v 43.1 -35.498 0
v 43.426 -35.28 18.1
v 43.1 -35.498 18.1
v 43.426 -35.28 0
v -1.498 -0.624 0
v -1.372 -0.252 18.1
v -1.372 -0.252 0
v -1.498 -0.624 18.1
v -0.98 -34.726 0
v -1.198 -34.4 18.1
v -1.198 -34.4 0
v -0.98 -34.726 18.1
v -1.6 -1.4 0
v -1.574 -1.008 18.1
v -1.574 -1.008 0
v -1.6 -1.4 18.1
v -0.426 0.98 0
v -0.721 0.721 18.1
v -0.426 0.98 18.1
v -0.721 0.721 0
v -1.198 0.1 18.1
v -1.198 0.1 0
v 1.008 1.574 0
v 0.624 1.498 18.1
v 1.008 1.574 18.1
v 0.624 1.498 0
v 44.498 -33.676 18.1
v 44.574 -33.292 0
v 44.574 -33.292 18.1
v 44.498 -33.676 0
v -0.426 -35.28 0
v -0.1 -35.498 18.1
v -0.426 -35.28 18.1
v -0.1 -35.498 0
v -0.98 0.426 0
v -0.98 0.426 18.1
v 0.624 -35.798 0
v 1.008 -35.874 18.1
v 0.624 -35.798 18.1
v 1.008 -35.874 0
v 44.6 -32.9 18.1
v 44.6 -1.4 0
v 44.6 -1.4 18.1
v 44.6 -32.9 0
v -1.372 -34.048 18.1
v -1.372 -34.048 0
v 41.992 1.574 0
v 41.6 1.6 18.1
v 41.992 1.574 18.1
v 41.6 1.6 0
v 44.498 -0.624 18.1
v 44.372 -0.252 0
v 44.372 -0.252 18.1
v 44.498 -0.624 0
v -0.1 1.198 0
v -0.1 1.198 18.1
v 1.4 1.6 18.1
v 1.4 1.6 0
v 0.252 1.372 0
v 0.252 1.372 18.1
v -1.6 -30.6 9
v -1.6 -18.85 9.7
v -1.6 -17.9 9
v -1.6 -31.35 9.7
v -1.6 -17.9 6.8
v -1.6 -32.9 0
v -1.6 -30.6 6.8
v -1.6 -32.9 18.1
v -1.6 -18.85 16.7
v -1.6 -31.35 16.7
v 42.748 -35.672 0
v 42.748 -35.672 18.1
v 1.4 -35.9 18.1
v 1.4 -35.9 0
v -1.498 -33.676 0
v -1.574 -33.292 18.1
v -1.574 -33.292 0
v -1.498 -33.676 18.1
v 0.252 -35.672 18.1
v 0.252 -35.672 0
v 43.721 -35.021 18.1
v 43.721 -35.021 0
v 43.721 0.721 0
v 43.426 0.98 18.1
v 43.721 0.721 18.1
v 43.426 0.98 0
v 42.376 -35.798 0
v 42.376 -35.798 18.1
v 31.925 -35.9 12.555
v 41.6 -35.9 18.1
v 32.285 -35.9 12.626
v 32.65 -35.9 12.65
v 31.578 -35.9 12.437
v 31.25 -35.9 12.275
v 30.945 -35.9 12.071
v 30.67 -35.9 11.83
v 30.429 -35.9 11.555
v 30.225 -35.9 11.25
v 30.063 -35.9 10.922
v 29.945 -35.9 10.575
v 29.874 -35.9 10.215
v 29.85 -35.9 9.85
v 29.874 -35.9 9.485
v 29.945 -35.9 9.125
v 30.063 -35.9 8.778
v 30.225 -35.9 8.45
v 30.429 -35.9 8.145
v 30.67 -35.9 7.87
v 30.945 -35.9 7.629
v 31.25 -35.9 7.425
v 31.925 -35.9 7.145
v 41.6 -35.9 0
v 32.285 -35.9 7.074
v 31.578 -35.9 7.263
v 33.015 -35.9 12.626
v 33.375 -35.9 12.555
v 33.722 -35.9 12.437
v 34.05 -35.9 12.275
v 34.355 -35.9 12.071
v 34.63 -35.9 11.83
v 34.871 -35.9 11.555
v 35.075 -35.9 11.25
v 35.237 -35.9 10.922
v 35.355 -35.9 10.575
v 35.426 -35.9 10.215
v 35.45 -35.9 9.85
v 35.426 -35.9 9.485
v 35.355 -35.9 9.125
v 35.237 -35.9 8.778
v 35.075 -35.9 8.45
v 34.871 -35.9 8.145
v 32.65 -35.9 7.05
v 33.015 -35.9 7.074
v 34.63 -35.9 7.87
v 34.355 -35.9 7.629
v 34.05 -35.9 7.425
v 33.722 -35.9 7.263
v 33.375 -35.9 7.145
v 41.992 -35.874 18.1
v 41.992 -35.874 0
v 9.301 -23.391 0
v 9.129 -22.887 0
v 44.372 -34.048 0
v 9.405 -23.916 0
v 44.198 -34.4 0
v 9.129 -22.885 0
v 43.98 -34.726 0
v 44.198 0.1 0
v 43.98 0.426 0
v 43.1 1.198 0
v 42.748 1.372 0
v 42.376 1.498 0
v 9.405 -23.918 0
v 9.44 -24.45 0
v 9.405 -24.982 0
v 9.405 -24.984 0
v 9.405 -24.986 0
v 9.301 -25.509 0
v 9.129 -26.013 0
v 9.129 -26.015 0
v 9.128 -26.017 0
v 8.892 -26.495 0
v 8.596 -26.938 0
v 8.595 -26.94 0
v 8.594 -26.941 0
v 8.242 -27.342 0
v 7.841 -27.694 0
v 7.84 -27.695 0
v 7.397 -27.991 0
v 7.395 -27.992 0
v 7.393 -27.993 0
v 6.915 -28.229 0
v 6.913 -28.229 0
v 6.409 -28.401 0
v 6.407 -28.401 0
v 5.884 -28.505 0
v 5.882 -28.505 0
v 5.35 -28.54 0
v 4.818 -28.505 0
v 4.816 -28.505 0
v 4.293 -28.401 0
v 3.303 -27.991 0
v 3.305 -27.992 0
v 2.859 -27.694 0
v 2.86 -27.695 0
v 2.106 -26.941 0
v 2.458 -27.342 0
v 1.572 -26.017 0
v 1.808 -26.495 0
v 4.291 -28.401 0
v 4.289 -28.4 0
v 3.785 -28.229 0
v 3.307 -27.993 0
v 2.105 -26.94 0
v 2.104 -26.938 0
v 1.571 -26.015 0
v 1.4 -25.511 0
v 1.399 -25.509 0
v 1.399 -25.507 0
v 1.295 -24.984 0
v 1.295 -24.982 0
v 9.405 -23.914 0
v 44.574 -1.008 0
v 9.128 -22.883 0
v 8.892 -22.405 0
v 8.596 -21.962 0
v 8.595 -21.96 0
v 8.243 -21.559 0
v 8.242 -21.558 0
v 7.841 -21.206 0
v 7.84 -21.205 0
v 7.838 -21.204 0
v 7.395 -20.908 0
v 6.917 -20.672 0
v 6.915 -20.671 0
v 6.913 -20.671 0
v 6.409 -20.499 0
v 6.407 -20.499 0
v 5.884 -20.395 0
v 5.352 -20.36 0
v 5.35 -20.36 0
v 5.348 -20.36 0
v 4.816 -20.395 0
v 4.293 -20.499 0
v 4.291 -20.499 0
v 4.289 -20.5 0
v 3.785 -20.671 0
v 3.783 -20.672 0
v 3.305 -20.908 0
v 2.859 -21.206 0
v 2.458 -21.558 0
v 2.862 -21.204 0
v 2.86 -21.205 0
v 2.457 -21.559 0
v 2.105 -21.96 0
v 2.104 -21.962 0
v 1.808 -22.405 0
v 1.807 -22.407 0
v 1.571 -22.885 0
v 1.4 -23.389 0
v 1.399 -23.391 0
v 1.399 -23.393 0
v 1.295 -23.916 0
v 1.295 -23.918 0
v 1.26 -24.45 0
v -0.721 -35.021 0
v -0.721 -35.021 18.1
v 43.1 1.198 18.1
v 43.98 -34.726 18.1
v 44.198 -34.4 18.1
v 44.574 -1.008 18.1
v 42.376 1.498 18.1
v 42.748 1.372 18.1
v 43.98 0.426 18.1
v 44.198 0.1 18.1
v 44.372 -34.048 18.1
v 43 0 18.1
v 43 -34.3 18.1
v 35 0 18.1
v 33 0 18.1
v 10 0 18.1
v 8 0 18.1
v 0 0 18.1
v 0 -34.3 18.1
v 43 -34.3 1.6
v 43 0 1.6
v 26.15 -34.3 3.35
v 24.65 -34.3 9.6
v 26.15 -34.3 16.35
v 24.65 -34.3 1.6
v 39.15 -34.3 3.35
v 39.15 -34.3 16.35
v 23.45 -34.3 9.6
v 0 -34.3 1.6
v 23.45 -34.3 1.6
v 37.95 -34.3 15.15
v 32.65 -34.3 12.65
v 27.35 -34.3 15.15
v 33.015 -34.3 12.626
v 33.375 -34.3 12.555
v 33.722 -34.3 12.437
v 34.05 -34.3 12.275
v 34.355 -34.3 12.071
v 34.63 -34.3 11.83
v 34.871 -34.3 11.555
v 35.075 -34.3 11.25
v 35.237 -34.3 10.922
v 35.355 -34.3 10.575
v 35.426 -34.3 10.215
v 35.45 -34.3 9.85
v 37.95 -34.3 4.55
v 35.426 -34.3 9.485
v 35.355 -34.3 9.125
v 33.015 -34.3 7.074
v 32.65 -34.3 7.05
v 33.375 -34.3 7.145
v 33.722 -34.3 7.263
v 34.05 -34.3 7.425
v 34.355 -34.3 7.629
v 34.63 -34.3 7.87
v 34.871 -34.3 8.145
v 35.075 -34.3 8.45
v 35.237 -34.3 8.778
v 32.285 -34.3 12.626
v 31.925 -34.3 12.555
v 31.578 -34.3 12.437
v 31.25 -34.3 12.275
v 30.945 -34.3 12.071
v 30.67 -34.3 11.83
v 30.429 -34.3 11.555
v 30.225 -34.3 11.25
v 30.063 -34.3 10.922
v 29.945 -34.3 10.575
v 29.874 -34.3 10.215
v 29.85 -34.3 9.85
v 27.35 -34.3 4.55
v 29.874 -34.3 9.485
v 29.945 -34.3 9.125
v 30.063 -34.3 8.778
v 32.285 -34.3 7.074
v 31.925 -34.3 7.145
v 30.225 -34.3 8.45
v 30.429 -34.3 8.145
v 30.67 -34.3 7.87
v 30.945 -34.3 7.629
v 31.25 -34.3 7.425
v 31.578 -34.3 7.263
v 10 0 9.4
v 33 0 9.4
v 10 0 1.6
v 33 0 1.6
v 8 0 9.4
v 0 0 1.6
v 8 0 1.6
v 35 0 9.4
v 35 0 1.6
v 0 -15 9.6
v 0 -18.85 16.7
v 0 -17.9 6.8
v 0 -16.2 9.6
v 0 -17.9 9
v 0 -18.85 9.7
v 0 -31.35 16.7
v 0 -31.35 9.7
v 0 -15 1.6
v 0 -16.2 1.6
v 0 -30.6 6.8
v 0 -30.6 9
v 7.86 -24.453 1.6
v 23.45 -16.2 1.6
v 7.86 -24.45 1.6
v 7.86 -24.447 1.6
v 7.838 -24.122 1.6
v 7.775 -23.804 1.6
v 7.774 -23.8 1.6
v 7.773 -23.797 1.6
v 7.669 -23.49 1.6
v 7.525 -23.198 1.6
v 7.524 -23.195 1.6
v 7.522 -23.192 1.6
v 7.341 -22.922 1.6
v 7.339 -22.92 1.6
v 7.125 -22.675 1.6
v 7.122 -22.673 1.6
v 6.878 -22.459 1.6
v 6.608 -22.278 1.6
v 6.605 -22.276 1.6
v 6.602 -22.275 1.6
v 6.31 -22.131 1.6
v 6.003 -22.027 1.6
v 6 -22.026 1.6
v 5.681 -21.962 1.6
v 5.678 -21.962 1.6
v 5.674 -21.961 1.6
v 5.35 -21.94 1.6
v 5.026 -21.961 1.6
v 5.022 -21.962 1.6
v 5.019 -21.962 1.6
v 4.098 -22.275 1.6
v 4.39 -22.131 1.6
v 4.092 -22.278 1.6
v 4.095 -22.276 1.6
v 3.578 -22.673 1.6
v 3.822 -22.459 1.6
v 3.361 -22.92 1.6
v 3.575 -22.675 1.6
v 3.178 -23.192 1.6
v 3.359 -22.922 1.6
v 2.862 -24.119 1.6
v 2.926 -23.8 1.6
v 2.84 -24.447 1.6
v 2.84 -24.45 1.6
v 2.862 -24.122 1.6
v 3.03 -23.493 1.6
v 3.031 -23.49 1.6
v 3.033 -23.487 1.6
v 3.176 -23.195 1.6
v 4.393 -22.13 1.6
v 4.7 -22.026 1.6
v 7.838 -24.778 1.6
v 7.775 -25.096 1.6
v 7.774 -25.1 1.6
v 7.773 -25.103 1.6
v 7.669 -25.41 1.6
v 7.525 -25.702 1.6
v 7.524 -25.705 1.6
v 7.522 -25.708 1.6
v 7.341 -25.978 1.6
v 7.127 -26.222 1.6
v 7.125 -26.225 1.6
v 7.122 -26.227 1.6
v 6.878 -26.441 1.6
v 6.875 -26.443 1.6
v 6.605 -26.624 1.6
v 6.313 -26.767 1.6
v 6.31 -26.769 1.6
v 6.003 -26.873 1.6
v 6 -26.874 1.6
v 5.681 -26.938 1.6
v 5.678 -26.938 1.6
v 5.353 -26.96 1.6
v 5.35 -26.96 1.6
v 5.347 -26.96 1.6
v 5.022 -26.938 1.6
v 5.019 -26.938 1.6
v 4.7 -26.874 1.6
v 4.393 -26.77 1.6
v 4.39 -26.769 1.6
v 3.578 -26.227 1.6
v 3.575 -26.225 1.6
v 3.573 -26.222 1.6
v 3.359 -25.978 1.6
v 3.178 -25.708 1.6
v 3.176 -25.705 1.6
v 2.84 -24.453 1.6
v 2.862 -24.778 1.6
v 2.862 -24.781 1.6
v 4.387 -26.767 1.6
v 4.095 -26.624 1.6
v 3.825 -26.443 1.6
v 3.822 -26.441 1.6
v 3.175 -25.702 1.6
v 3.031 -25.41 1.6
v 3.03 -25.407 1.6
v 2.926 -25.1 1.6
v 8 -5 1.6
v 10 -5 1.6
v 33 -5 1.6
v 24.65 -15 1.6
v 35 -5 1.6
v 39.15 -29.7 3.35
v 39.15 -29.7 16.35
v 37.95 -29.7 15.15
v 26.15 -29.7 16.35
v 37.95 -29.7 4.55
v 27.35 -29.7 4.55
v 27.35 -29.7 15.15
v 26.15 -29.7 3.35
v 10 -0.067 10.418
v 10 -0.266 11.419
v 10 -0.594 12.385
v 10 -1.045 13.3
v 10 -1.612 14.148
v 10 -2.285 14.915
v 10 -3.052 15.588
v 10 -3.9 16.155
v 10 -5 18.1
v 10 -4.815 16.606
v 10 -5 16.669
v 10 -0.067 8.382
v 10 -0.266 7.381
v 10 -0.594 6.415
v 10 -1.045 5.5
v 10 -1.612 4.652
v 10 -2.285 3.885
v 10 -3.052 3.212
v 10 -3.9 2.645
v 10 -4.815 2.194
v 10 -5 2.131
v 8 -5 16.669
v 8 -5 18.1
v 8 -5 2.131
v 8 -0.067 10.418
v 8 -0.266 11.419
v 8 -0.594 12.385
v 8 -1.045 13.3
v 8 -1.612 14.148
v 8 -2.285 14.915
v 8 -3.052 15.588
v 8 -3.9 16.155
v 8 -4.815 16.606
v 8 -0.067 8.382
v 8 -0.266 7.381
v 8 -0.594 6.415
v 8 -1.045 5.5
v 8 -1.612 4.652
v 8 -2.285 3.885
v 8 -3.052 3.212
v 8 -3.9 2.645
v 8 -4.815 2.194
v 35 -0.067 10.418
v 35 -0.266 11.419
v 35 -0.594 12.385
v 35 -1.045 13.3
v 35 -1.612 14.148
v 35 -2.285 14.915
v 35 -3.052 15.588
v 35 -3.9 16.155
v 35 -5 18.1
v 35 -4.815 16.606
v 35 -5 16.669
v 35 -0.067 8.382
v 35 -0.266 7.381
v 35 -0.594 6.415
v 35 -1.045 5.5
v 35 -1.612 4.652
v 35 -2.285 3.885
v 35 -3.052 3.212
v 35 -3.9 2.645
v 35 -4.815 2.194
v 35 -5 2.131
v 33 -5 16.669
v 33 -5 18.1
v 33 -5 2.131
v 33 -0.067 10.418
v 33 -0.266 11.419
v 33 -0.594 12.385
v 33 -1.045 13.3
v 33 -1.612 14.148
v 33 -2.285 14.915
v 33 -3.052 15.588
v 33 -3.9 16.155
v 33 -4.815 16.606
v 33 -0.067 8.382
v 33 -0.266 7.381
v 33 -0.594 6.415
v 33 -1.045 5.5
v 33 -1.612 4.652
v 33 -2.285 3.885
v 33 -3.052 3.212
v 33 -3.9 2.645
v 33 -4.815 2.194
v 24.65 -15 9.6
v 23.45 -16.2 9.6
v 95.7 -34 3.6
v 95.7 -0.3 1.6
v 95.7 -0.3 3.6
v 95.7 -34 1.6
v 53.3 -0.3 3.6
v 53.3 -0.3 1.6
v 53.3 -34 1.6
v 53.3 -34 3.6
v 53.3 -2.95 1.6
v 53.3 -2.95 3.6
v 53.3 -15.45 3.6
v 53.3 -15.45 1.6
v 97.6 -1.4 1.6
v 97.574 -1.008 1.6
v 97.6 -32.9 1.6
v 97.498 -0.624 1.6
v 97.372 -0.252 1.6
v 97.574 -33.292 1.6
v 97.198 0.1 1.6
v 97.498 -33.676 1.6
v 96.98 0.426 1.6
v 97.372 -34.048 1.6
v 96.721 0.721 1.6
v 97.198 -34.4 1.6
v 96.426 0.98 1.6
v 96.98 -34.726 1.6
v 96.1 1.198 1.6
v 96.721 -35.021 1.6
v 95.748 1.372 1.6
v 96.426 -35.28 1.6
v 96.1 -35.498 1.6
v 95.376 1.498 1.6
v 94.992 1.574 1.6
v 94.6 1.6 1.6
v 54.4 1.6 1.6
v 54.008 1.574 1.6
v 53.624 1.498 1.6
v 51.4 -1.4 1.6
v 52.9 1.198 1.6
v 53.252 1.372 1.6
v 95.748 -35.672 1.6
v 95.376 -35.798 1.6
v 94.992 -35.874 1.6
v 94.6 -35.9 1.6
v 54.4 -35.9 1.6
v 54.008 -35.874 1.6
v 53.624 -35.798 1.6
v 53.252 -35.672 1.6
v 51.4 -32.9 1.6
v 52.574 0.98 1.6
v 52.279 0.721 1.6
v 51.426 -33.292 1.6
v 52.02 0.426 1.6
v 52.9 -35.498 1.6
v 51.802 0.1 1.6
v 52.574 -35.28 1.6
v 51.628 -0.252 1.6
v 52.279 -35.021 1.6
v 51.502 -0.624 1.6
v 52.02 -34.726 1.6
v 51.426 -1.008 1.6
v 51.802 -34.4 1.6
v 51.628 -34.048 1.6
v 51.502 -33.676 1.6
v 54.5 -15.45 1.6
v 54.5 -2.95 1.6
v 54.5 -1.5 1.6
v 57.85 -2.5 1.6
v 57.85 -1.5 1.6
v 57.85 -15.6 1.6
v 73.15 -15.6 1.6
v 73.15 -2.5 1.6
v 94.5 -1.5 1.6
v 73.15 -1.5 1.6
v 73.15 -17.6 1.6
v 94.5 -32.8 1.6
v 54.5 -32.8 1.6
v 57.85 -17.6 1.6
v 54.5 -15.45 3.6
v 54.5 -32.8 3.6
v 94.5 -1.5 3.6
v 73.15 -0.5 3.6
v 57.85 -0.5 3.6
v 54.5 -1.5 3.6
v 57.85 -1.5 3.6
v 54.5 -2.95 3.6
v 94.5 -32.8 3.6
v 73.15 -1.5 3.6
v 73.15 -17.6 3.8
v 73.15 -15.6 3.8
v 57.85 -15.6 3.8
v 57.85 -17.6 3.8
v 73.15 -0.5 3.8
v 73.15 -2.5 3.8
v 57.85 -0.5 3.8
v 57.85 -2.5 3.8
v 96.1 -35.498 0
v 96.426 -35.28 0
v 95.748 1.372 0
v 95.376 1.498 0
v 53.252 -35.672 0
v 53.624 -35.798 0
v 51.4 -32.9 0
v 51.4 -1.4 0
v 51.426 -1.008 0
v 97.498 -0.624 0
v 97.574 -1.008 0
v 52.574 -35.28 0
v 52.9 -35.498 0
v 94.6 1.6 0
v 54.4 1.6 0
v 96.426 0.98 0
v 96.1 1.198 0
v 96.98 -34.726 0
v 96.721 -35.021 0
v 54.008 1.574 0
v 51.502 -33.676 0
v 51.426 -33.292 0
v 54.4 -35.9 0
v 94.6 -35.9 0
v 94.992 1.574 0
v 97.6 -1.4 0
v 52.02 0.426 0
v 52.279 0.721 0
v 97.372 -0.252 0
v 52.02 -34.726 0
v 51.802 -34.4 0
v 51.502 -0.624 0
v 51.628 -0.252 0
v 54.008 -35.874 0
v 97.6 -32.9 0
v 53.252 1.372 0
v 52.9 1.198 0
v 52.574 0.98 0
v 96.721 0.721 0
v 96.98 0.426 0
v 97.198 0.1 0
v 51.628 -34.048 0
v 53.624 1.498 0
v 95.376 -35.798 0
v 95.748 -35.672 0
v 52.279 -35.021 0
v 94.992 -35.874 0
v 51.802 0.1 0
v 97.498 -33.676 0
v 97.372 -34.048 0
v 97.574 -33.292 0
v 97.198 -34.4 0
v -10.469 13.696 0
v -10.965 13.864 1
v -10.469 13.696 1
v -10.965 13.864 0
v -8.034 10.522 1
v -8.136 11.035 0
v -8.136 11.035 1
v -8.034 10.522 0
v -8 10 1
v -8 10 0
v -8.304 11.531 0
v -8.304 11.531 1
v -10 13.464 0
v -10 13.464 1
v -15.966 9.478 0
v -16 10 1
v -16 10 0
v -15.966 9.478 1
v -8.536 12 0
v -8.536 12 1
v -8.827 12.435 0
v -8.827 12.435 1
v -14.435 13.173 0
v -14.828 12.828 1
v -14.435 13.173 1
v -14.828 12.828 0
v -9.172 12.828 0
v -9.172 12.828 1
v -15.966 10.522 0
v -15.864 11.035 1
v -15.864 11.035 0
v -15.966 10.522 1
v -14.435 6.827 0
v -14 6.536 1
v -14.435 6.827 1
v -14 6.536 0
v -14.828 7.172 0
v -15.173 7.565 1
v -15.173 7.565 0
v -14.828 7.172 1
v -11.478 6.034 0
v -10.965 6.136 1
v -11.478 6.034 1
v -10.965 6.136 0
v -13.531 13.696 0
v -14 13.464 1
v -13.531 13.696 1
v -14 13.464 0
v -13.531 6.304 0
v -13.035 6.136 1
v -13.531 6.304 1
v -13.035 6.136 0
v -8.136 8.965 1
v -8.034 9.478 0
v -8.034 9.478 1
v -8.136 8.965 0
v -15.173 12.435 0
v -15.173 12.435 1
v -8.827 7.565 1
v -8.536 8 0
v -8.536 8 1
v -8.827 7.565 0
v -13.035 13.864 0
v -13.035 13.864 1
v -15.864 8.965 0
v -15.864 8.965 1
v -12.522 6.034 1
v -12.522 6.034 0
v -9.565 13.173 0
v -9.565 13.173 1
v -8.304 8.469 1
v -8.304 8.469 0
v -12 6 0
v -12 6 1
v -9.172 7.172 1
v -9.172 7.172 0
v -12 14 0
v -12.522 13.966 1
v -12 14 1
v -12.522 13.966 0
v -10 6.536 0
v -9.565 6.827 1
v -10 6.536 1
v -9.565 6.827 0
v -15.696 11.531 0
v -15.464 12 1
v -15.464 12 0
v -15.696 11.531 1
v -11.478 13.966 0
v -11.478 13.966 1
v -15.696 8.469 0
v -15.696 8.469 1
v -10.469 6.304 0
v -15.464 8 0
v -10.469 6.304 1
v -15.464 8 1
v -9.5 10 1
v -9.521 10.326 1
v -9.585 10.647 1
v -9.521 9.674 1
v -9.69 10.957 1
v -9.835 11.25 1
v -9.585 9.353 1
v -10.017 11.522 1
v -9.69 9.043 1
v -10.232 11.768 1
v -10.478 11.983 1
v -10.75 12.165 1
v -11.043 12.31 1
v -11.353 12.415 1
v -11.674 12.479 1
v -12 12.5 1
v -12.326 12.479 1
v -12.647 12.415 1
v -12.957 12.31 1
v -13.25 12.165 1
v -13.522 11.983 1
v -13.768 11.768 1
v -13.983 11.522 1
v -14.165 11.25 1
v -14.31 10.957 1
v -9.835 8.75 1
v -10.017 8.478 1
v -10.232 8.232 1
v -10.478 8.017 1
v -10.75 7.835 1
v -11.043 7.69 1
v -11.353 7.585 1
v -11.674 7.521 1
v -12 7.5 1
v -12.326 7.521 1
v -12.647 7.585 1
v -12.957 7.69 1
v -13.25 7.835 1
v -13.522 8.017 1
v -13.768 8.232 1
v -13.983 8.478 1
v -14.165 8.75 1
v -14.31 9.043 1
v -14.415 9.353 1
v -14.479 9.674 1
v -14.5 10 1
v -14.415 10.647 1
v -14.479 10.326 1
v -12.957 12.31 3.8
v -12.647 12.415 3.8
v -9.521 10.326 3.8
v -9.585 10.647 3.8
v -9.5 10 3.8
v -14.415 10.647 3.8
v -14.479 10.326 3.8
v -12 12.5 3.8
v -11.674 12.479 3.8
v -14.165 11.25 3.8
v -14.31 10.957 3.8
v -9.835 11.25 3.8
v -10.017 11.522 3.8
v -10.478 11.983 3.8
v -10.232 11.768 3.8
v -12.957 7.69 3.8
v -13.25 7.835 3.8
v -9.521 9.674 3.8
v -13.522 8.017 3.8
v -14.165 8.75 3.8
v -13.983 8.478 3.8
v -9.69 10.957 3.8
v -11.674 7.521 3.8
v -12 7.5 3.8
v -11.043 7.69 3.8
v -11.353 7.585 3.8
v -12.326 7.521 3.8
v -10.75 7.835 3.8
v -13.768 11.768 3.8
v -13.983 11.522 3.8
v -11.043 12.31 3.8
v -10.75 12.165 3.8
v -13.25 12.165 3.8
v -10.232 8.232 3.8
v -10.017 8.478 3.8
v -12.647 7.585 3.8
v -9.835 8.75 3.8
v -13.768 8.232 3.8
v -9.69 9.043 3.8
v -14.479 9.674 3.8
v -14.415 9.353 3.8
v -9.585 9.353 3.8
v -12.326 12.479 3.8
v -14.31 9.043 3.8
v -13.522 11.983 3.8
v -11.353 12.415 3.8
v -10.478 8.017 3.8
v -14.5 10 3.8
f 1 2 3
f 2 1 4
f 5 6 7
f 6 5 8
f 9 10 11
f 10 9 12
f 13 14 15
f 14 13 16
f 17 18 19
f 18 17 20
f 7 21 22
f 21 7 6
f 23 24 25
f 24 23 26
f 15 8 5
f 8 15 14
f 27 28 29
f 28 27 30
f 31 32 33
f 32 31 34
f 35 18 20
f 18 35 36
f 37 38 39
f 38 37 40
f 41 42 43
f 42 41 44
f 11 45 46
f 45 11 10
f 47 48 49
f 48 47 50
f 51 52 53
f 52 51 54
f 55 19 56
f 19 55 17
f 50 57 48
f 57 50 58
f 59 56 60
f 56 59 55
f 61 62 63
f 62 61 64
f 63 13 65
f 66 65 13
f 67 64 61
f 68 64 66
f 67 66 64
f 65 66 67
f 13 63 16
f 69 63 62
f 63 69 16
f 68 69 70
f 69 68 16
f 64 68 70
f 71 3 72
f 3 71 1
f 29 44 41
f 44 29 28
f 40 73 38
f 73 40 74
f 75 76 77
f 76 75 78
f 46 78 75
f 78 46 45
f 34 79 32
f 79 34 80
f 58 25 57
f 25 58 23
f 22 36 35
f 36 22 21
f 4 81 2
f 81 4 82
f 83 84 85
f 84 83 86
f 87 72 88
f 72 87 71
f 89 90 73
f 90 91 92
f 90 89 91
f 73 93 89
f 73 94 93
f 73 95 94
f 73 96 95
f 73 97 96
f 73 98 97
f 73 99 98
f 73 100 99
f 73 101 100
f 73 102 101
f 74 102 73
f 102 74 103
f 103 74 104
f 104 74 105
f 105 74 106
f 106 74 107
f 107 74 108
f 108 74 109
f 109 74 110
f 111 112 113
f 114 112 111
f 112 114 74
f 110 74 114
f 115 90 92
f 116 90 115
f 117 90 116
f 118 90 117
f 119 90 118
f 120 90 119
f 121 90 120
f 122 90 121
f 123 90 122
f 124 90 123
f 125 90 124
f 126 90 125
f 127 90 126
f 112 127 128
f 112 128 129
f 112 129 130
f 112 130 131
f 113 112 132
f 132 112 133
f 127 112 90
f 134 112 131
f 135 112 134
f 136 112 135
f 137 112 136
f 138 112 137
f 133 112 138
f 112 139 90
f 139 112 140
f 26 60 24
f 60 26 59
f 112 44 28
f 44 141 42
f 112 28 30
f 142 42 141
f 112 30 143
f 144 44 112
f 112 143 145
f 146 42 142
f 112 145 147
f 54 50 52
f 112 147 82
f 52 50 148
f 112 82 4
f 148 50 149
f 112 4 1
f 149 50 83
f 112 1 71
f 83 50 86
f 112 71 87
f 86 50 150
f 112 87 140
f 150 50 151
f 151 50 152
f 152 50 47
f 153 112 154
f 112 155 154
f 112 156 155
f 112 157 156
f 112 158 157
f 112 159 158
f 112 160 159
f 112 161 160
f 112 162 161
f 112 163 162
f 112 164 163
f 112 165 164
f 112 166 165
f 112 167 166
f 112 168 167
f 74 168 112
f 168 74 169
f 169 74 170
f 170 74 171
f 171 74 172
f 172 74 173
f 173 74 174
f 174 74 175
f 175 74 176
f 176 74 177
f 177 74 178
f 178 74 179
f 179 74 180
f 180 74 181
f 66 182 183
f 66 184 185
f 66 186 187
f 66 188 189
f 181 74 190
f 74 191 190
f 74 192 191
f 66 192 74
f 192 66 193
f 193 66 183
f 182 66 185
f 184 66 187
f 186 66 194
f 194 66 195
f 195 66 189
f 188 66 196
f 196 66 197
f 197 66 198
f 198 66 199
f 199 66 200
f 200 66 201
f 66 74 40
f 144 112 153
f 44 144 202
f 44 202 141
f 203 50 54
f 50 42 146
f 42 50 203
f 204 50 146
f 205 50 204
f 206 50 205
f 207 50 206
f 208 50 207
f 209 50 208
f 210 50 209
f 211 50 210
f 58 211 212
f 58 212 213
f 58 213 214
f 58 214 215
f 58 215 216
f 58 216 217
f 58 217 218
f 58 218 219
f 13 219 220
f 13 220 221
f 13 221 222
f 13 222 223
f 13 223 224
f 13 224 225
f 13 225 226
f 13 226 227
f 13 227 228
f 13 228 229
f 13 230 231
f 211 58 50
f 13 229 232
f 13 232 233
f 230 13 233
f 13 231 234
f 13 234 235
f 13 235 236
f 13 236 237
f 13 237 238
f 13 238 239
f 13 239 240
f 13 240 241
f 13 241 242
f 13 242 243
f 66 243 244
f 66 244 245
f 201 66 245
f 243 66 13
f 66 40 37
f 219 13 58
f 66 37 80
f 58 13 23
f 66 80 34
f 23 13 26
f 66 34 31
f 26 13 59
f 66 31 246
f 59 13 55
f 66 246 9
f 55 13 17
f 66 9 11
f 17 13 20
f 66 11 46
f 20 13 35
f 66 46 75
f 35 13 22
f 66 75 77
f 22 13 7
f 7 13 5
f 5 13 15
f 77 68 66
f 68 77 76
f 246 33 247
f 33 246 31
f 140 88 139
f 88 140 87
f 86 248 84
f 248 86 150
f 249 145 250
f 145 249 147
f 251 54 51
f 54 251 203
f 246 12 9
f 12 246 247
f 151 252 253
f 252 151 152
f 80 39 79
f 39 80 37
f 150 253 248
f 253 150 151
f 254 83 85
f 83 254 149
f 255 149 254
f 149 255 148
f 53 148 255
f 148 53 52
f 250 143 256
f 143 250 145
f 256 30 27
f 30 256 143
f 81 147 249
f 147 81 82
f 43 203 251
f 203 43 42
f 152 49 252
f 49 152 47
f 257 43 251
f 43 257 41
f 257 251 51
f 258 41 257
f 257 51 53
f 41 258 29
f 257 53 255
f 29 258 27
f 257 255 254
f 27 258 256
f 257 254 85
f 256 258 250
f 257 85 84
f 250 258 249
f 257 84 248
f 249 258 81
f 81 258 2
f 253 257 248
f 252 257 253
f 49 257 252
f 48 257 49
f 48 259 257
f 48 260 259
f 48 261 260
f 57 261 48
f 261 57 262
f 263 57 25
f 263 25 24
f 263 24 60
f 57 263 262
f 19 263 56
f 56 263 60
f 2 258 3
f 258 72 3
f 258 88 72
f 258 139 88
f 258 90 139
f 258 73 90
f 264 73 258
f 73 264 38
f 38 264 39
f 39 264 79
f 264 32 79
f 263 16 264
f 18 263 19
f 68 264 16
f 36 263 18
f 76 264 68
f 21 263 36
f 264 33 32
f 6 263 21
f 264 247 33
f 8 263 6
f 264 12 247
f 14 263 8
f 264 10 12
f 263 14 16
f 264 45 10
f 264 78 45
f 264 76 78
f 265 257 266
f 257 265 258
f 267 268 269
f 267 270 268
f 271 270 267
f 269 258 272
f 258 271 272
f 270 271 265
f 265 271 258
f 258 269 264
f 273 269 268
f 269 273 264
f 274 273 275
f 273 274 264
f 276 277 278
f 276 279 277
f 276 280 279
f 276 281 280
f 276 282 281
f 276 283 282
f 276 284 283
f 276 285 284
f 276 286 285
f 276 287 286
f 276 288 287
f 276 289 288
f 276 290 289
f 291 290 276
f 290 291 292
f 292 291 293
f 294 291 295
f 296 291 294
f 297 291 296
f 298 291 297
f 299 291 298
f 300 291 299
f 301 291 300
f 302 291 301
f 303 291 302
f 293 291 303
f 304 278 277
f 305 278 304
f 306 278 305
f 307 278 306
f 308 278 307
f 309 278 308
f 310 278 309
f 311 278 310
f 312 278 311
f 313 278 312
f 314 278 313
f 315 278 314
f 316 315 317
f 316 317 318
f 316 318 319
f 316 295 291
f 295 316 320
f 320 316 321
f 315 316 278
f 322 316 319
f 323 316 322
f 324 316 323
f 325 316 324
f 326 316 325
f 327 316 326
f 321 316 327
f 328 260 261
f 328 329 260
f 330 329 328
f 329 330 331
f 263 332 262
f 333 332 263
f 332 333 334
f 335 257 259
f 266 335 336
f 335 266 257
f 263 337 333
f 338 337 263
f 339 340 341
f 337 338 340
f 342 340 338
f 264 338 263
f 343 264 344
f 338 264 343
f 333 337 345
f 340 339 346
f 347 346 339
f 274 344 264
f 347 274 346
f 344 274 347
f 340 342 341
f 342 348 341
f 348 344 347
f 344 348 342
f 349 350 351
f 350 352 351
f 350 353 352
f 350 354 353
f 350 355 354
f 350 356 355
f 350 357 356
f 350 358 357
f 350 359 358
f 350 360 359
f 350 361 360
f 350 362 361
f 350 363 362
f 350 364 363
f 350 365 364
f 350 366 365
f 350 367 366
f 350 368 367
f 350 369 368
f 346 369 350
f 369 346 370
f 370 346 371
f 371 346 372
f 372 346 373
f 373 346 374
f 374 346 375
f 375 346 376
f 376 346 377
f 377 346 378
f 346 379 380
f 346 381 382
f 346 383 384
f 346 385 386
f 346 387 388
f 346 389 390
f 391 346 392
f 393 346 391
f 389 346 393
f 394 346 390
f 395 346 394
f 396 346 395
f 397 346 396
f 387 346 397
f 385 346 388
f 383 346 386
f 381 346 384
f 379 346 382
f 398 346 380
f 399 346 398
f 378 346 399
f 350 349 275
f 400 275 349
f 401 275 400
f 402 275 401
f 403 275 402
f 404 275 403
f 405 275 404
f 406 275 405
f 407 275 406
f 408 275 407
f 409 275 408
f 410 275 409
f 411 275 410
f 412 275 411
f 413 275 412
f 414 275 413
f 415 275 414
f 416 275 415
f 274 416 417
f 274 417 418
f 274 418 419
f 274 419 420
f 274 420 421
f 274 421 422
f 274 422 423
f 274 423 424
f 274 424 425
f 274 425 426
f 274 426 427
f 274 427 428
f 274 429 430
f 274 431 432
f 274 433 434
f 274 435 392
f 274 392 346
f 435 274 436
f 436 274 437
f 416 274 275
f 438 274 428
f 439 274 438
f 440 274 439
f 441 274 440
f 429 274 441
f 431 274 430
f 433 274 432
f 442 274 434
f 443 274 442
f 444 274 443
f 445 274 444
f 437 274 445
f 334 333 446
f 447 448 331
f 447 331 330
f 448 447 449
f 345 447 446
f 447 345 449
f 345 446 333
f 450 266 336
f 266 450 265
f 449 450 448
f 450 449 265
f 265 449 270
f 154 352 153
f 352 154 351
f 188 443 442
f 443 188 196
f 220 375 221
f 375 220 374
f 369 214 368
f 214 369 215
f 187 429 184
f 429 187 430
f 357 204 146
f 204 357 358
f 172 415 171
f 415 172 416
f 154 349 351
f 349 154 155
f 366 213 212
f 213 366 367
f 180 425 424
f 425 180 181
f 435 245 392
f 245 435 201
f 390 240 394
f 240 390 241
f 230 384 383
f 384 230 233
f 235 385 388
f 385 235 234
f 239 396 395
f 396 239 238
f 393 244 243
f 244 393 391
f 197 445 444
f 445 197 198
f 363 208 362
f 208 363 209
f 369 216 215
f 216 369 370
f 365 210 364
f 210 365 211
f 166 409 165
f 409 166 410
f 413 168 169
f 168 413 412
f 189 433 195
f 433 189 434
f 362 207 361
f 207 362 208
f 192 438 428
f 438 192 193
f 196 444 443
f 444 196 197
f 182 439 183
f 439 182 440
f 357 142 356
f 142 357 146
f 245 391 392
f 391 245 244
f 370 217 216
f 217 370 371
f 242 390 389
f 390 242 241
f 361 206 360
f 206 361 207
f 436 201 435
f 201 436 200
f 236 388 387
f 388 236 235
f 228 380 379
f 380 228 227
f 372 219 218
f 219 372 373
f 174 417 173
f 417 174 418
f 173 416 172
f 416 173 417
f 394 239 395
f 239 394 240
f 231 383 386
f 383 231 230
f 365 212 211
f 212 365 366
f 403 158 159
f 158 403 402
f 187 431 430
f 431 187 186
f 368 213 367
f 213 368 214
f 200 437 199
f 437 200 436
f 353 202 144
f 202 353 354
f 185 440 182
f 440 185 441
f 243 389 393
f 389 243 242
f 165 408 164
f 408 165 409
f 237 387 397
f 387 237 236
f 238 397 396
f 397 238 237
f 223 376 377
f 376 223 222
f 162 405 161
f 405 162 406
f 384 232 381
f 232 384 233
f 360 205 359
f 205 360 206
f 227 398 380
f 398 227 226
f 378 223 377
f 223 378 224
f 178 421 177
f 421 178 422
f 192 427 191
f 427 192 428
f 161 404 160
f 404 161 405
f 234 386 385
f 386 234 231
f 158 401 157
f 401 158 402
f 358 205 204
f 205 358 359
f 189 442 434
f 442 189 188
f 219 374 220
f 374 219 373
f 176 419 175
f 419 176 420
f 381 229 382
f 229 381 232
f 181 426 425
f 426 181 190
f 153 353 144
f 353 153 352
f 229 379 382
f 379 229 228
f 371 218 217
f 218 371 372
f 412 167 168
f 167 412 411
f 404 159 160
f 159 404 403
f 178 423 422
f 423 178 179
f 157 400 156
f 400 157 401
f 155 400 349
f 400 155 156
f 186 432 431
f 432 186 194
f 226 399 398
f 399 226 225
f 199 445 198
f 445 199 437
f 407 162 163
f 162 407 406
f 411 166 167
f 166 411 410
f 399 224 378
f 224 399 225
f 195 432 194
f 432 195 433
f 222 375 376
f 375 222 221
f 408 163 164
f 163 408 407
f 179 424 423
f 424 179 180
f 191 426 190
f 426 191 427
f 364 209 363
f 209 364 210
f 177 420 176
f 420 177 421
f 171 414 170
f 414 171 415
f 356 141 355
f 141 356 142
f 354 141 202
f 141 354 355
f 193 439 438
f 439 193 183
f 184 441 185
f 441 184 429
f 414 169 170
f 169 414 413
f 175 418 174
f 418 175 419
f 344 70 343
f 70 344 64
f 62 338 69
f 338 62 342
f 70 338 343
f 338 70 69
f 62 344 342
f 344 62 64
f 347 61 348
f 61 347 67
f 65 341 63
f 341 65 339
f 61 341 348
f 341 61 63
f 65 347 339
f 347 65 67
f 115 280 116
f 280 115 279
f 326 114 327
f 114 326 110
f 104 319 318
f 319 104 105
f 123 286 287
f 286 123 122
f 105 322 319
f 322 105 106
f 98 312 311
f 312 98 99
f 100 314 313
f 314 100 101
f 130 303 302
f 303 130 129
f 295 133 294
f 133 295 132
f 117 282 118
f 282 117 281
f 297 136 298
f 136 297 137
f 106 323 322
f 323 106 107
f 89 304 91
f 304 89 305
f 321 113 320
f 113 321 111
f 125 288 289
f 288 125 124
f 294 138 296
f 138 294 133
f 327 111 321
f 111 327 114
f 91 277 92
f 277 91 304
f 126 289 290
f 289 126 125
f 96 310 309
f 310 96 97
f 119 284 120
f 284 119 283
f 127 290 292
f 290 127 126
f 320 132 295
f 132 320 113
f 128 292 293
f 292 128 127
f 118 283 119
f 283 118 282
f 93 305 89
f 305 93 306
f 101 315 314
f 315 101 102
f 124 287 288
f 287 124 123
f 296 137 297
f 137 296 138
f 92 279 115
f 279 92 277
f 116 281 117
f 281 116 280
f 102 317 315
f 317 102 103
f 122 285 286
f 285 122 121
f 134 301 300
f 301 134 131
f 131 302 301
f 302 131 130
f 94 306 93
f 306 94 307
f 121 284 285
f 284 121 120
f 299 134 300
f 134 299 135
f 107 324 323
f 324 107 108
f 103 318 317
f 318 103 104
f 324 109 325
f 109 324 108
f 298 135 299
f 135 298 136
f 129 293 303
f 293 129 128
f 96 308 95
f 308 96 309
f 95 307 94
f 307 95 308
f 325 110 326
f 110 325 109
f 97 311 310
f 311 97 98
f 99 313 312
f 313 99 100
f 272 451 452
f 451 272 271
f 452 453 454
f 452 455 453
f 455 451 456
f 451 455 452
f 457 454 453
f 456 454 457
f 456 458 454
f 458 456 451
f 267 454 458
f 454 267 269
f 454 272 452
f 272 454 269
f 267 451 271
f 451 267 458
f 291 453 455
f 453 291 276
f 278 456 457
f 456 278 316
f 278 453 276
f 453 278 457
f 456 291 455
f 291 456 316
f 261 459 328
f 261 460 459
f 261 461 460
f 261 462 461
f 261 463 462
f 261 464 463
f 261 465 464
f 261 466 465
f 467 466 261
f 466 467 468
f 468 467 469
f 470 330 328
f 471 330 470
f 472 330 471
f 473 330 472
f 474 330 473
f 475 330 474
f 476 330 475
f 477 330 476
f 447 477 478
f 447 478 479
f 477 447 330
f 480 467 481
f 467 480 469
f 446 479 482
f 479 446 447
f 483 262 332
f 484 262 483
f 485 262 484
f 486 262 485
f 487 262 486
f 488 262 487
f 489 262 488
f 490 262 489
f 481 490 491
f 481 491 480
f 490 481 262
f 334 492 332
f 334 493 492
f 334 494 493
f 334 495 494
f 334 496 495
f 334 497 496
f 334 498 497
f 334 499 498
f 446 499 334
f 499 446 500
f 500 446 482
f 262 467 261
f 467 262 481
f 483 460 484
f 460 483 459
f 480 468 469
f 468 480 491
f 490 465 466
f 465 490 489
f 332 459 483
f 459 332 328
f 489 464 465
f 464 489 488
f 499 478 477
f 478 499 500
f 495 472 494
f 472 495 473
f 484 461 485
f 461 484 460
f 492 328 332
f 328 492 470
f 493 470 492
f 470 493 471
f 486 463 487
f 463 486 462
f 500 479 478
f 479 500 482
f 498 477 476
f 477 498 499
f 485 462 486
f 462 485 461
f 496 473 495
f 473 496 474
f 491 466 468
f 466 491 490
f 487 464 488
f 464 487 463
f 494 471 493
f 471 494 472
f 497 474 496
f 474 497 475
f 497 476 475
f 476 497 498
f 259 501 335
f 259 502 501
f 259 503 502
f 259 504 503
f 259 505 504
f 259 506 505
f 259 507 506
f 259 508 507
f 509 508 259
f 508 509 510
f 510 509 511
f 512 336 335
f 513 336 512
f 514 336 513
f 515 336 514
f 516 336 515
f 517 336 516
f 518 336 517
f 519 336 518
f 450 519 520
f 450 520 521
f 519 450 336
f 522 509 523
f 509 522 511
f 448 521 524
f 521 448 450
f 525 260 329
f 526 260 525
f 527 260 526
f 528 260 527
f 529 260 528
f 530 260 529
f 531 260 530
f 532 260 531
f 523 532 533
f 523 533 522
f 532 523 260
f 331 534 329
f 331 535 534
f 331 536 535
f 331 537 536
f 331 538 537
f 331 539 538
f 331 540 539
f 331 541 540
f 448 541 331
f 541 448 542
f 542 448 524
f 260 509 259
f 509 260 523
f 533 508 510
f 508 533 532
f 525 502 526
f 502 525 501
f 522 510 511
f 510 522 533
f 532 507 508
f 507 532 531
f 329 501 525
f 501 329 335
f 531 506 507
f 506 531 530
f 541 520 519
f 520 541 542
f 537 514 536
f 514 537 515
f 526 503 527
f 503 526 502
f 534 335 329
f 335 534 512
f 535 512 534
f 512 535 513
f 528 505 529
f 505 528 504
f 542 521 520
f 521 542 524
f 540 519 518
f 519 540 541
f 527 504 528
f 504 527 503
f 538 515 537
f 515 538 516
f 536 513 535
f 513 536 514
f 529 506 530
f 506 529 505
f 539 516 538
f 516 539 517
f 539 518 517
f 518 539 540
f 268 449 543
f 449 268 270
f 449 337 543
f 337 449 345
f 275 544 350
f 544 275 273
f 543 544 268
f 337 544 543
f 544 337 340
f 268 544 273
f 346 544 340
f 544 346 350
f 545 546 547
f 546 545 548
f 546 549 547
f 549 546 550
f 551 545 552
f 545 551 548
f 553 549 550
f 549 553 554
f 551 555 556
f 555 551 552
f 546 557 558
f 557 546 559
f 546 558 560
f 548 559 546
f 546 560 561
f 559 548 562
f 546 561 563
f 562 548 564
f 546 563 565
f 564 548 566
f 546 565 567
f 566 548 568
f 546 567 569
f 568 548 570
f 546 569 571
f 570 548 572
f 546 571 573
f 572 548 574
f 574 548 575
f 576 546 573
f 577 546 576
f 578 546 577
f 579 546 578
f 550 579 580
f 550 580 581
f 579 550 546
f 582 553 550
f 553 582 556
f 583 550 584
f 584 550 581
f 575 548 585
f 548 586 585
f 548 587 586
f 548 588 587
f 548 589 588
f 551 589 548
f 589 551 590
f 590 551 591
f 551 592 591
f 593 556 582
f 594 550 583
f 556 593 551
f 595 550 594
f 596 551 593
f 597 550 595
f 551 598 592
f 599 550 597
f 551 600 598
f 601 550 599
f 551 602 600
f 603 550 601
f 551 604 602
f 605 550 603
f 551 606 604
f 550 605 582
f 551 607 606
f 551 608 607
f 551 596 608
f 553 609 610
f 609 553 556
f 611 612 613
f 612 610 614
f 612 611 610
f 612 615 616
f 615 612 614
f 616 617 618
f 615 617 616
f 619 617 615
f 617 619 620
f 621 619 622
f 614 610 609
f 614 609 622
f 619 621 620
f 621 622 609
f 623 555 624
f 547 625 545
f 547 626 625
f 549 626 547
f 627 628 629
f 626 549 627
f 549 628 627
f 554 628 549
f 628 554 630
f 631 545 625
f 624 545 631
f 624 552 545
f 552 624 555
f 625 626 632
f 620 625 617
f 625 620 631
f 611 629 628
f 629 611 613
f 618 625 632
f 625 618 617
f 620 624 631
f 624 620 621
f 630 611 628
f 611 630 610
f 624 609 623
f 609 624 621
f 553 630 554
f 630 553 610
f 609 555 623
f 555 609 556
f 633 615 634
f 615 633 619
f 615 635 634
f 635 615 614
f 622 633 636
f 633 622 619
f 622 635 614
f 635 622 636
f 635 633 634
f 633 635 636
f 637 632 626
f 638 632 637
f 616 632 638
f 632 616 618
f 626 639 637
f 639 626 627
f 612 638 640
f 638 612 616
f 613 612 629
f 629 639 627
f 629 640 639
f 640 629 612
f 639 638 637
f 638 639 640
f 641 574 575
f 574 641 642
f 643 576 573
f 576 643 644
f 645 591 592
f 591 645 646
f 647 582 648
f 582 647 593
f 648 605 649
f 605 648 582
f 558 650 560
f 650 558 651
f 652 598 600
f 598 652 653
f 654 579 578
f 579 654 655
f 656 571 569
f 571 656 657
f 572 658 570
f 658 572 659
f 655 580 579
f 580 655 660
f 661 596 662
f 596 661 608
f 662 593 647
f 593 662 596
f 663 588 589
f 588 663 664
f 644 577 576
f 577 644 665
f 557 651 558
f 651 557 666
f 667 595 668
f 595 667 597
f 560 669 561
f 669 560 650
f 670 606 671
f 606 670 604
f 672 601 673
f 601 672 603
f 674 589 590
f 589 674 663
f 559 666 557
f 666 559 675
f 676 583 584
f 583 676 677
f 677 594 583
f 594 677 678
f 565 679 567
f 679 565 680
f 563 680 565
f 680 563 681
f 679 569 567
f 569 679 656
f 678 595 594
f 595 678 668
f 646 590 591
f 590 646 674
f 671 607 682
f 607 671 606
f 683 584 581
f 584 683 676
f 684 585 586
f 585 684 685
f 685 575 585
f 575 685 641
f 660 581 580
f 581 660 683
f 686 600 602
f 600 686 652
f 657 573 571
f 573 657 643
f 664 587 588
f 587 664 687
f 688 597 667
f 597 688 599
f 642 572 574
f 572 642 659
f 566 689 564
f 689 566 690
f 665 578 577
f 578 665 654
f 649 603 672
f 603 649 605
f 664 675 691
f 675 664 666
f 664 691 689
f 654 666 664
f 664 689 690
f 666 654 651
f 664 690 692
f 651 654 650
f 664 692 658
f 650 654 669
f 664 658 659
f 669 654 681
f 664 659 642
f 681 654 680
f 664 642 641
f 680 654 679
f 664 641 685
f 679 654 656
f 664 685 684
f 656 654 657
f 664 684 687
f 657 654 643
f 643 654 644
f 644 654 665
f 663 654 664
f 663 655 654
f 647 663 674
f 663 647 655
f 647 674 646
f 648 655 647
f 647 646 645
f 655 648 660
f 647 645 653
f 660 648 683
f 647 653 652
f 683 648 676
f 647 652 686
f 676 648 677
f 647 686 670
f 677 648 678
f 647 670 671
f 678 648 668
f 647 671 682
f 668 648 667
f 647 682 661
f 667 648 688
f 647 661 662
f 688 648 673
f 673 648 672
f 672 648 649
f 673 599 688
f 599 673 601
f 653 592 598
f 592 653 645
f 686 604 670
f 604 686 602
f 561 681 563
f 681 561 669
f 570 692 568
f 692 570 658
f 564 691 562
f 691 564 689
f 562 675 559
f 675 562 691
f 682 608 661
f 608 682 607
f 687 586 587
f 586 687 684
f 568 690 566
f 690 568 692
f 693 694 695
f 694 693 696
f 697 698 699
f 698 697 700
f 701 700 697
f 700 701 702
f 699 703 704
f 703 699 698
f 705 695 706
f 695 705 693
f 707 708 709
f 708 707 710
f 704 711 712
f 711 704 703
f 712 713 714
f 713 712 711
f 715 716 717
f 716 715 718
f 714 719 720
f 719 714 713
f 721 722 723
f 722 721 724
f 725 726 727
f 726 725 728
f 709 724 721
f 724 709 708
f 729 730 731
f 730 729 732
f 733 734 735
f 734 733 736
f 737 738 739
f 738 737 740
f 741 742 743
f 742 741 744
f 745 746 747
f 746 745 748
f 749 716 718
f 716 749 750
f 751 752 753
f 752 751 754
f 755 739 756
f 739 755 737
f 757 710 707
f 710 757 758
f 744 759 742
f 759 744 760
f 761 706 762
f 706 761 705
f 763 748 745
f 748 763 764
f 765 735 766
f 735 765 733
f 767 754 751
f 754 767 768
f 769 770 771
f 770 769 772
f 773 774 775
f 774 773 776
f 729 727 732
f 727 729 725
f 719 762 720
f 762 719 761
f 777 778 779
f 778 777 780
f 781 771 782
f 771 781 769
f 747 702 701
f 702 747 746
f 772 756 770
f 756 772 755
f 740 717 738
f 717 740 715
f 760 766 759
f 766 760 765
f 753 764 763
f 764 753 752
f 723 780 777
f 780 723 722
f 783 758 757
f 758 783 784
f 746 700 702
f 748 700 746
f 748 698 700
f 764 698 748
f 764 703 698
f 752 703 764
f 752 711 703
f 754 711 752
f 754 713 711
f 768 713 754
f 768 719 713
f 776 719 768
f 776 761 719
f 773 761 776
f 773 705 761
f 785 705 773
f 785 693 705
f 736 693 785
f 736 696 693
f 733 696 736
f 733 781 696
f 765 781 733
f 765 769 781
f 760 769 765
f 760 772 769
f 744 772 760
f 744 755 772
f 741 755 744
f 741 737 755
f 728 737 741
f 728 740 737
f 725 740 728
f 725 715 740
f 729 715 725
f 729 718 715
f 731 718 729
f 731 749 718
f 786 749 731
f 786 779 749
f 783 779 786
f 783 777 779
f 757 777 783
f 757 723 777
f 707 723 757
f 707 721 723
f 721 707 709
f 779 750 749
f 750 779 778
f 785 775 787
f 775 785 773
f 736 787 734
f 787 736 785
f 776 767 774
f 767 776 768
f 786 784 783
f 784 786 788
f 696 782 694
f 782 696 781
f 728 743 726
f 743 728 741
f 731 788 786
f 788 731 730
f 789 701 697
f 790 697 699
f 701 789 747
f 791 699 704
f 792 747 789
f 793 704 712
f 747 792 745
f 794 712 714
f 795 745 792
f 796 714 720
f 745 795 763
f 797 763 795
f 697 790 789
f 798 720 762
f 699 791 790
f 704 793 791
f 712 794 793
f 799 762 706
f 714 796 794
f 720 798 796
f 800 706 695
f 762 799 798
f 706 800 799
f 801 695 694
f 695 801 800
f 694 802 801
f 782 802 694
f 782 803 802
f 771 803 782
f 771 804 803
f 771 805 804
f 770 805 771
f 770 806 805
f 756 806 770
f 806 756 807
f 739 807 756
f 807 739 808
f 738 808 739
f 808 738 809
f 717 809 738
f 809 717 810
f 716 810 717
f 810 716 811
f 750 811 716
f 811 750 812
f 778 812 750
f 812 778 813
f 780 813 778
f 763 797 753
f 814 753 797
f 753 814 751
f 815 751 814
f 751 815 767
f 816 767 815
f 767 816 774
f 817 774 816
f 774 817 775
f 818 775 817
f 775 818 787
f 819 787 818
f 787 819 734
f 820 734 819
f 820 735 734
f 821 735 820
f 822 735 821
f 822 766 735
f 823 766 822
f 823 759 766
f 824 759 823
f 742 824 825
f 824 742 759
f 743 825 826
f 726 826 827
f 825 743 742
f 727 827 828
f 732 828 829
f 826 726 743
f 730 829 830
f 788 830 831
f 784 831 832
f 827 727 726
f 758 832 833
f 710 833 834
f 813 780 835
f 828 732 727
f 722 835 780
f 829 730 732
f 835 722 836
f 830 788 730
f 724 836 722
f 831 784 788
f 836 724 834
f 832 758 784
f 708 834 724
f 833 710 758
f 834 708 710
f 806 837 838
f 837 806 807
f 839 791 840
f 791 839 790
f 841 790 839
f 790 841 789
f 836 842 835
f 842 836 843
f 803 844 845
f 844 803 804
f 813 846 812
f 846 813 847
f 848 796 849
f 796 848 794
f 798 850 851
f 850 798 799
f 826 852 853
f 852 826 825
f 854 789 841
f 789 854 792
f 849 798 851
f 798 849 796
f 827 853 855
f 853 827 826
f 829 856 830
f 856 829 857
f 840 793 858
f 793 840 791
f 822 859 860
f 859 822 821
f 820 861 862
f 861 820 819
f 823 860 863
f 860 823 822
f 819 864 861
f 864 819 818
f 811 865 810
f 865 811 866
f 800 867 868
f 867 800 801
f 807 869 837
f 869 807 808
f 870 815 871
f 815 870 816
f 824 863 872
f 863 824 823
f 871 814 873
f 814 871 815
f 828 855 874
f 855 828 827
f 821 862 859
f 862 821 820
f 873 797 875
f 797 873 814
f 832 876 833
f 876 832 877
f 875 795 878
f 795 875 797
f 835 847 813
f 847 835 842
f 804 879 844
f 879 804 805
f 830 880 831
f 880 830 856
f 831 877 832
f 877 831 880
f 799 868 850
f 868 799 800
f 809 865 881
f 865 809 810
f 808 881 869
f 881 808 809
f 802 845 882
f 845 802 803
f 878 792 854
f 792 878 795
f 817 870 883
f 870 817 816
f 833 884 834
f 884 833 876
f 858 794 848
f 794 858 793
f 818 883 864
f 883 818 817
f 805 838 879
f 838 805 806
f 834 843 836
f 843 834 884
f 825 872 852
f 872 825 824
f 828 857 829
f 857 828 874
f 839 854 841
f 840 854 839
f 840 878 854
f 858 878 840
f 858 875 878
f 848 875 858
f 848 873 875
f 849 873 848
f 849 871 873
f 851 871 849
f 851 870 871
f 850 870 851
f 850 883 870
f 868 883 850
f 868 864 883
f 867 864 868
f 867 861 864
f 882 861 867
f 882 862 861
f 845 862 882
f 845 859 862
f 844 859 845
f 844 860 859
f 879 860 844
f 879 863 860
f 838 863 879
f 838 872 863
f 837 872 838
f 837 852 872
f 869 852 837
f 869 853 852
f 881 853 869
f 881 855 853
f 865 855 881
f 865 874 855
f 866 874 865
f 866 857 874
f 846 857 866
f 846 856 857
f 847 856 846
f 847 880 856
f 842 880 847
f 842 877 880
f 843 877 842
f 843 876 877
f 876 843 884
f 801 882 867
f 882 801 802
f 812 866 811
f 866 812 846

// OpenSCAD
// mini-cam case: XIAO ESP32-S3 Sense + 15x40 mm cylinder LiPo + 10x10 mm button board.
// All sizes in mm. Change a number, re-export. part = "body" | "lid" | "cap" | "all" (print layout) | "view"
part = "all";
$fn = 48;

wall = 1.6;   // shell thickness
tol  = 0.3;   // print clearance per side
r    = 3;     // outer corner radius

// XIAO + Sense stack, lens facing the front wall, USB-C facing the left wall.
// Numbers from Seeed's official 3D model (seeed-studio-xiao-esp32s3-sense-3d_model.zip).
pcb_w   = 21.3;  // board envelope along USB direction (PCB 20.95 + parts overhanging the far end)
pcb_h   = 17.8;
stack_d = 14;    // lens top to XIAO back
usb_out = 1.55;  // USB-C sticks out past the PCB edge
sd_out  = 3.1;   // microSD socket sticks out past the PCB edge, above the USB-C
sd_y    = [5.5, 7.1];    // microSD socket depth range, from the lens top
sd_z    = [2.0, 14.1];   // microSD socket range, from the board's bottom edge
lens_x  = 3.5;   // lens centre from the USB-C edge of the PCB
lens_z  = 8.25;  // lens centre from the board's bottom edge (the edge near the battery)
lens_d  = 5;     // hole in front wall; smaller than the lens barrel, so the barrel rests on the wall
usb_y   = 11.6;  // USB-C centre, back from the front inner wall
usb_z   = 8.9;   // USB-C centre from the board's bottom edge
usb_w   = 12.5;  // opening fits the plug's plastic body, so the plug goes in fully
usb_h   = 7;

// battery: cylinder lying along the bottom
bat_d = 15;
bat_l = 40;

// button: 10x10 PCB glued under the top wall, printed plunger cap through it
btn_pcb = 10;
btn_t   = 1.6;  // PCB thickness
sw_h    = 2;    // switch height above its PCB   <- MEASURE
cap_d   = 5;    // plunger diameter
flange  = 1;    // plunger flange under the top wall, keeps it from falling out

// interior
iw = bat_l + 3;
ih = bat_d + pcb_h + 1.5;
id = stack_d + 2.5;  // room behind the board for wires; antenna FPC sticks to the lid

bx = usb_out + tol;     // PCB's USB-C edge; USB-C face sits just inside the left wall
bz = ih - pcb_h - tol;  // board sits against the top wall
btn_x = pcb_w + 1 + (iw - pcb_w - 1) / 2;  // free space right of the board
btn_y = id / 2;

module rbox(w, d, h, rr) {  // box rounded around the y (front-back) axis
  hull() for (x = [rr, w - rr], z = [rr, h - rr])
    translate([x, 0, z]) rotate([-90, 0, 0]) cylinder(r = rr, h = d);
}

module body() {
  difference() {
    translate([-wall, -wall, -wall]) rbox(iw + 2 * wall, id + wall, ih + 2 * wall, r);
    cube([iw, id + 1, ih]);
    // lens, with a 45-degree outer chamfer so the frame doesn't vignette
    translate([bx + lens_x, -wall - 0.01, bz + lens_z]) rotate([-90, 0, 0])
      cylinder(d1 = lens_d + 2 * wall, d2 = lens_d, h = wall + 0.02);
    // USB-C
    translate([-wall - 1, usb_y - usb_h / 2, bz + usb_z - usb_w / 2]) cube([wall + 2, usb_h, usb_w]);
    // microSD socket pokes into the left wall; the slot also lets you swap the card
    translate([-wall - 1, sd_y[0] - tol, bz + sd_z[0] - tol]) cube([wall + 2, sd_y[1] - sd_y[0] + 2 * tol, sd_z[1] - sd_z[0] + 2 * tol]);
    // button plunger hole
    translate([btn_x, btn_y, ih - 1]) cylinder(d = cap_d + 2 * tol, h = wall + 2);
  }
  // board frame: right and bottom sides (left/top are the case walls), short so wires pass behind
  fy = 8;
  translate([bx + pcb_w + tol, 0, bz - 1.2]) cube([1.2, fy, ih - bz + 1.2]);
  translate([0, 0, bz - 1.2]) cube([bx + pcb_w + tol + 1.2, fy, 1.2]);
  // button pocket: PCB pushed up into it and hot-glued, switch facing up
  pd = flange + sw_h + btn_t;
  translate([btn_x, btn_y, ih - pd]) difference() {
    translate([-btn_pcb / 2 - tol - 1.2, -btn_pcb / 2 - tol - 1.2, 0]) cube([btn_pcb + 2 * tol + 2.4, btn_pcb + 2 * tol + 2.4, pd]);
    translate([-btn_pcb / 2 - tol, -btn_pcb / 2 - tol, -1]) cube([btn_pcb + 2 * tol, btn_pcb + 2 * tol, pd + 2]);
  }
  // battery cradle ribs
  for (x = [8, iw - 10]) difference() {
    translate([x, 0, 0]) cube([2, id, 5]);
    translate([x - 1, bat_d / 2 + tol, bat_d / 2 + tol]) rotate([0, 90, 0]) cylinder(d = bat_d + 2 * tol, h = 4);
  }
}

module lid() {
  lip = id - stack_d - tol - 0.2;  // stops short of the board stack
  translate([-wall, id, -wall]) rbox(iw + 2 * wall, wall, ih + 2 * wall, r);
  // friction lip that slides into the body, notched around the USB-C plug
  difference() {
    translate([0, id - lip, 0]) difference() {
      translate([tol, 0, tol]) cube([iw - 2 * tol, lip, ih - 2 * tol]);
      translate([tol + 1.2, -1, tol + 1.2]) cube([iw - 2 * tol - 2.4, lip + 2, ih - 2 * tol - 2.4]);
    }
    translate([-1, usb_y - usb_h / 2, bz + usb_z - usb_w / 2]) cube([bx + 1, id, usb_w]);
  }
  // two ribs along the board's long edges press the stack against the front wall
  // (centre left free: battery pads and wires are on the XIAO's back)
  for (z = [bz + 0.5, ih - 2.5])
    translate([bx + 3, stack_d + tol, z]) cube([pcb_w - 6, id - stack_d - tol, 2]);
}

module cap() {  // printed flange-down
  cylinder(d = cap_d + 3, h = flange);
  cylinder(d = cap_d, h = flange + wall + 1.2);  // sticks out 1.2 mm
}

if (part == "body") rotate([90, 0, 0]) translate([0, wall, 0]) body();
if (part == "lid")  translate([0, 0, id + wall]) rotate([-90, 0, 0]) lid();
if (part == "cap")  cap();
if (part == "all") {  // everything laid out on the bed
  translate([0, 0, wall]) rotate([90, 0, 0]) body();
  translate([iw + 10, 0, id + wall]) rotate([-90, 0, 0]) translate([0, 0, -ih]) lid();
  translate([-12, 10, 0]) cap();
}
if (part == "view") {  // assembled, lid pulled back
  color("SteelBlue") body();
  color("LightSteelBlue") translate([0, 12, 0]) lid();
  color("Orange") translate([btn_x, btn_y, ih - flange]) cap();
}
